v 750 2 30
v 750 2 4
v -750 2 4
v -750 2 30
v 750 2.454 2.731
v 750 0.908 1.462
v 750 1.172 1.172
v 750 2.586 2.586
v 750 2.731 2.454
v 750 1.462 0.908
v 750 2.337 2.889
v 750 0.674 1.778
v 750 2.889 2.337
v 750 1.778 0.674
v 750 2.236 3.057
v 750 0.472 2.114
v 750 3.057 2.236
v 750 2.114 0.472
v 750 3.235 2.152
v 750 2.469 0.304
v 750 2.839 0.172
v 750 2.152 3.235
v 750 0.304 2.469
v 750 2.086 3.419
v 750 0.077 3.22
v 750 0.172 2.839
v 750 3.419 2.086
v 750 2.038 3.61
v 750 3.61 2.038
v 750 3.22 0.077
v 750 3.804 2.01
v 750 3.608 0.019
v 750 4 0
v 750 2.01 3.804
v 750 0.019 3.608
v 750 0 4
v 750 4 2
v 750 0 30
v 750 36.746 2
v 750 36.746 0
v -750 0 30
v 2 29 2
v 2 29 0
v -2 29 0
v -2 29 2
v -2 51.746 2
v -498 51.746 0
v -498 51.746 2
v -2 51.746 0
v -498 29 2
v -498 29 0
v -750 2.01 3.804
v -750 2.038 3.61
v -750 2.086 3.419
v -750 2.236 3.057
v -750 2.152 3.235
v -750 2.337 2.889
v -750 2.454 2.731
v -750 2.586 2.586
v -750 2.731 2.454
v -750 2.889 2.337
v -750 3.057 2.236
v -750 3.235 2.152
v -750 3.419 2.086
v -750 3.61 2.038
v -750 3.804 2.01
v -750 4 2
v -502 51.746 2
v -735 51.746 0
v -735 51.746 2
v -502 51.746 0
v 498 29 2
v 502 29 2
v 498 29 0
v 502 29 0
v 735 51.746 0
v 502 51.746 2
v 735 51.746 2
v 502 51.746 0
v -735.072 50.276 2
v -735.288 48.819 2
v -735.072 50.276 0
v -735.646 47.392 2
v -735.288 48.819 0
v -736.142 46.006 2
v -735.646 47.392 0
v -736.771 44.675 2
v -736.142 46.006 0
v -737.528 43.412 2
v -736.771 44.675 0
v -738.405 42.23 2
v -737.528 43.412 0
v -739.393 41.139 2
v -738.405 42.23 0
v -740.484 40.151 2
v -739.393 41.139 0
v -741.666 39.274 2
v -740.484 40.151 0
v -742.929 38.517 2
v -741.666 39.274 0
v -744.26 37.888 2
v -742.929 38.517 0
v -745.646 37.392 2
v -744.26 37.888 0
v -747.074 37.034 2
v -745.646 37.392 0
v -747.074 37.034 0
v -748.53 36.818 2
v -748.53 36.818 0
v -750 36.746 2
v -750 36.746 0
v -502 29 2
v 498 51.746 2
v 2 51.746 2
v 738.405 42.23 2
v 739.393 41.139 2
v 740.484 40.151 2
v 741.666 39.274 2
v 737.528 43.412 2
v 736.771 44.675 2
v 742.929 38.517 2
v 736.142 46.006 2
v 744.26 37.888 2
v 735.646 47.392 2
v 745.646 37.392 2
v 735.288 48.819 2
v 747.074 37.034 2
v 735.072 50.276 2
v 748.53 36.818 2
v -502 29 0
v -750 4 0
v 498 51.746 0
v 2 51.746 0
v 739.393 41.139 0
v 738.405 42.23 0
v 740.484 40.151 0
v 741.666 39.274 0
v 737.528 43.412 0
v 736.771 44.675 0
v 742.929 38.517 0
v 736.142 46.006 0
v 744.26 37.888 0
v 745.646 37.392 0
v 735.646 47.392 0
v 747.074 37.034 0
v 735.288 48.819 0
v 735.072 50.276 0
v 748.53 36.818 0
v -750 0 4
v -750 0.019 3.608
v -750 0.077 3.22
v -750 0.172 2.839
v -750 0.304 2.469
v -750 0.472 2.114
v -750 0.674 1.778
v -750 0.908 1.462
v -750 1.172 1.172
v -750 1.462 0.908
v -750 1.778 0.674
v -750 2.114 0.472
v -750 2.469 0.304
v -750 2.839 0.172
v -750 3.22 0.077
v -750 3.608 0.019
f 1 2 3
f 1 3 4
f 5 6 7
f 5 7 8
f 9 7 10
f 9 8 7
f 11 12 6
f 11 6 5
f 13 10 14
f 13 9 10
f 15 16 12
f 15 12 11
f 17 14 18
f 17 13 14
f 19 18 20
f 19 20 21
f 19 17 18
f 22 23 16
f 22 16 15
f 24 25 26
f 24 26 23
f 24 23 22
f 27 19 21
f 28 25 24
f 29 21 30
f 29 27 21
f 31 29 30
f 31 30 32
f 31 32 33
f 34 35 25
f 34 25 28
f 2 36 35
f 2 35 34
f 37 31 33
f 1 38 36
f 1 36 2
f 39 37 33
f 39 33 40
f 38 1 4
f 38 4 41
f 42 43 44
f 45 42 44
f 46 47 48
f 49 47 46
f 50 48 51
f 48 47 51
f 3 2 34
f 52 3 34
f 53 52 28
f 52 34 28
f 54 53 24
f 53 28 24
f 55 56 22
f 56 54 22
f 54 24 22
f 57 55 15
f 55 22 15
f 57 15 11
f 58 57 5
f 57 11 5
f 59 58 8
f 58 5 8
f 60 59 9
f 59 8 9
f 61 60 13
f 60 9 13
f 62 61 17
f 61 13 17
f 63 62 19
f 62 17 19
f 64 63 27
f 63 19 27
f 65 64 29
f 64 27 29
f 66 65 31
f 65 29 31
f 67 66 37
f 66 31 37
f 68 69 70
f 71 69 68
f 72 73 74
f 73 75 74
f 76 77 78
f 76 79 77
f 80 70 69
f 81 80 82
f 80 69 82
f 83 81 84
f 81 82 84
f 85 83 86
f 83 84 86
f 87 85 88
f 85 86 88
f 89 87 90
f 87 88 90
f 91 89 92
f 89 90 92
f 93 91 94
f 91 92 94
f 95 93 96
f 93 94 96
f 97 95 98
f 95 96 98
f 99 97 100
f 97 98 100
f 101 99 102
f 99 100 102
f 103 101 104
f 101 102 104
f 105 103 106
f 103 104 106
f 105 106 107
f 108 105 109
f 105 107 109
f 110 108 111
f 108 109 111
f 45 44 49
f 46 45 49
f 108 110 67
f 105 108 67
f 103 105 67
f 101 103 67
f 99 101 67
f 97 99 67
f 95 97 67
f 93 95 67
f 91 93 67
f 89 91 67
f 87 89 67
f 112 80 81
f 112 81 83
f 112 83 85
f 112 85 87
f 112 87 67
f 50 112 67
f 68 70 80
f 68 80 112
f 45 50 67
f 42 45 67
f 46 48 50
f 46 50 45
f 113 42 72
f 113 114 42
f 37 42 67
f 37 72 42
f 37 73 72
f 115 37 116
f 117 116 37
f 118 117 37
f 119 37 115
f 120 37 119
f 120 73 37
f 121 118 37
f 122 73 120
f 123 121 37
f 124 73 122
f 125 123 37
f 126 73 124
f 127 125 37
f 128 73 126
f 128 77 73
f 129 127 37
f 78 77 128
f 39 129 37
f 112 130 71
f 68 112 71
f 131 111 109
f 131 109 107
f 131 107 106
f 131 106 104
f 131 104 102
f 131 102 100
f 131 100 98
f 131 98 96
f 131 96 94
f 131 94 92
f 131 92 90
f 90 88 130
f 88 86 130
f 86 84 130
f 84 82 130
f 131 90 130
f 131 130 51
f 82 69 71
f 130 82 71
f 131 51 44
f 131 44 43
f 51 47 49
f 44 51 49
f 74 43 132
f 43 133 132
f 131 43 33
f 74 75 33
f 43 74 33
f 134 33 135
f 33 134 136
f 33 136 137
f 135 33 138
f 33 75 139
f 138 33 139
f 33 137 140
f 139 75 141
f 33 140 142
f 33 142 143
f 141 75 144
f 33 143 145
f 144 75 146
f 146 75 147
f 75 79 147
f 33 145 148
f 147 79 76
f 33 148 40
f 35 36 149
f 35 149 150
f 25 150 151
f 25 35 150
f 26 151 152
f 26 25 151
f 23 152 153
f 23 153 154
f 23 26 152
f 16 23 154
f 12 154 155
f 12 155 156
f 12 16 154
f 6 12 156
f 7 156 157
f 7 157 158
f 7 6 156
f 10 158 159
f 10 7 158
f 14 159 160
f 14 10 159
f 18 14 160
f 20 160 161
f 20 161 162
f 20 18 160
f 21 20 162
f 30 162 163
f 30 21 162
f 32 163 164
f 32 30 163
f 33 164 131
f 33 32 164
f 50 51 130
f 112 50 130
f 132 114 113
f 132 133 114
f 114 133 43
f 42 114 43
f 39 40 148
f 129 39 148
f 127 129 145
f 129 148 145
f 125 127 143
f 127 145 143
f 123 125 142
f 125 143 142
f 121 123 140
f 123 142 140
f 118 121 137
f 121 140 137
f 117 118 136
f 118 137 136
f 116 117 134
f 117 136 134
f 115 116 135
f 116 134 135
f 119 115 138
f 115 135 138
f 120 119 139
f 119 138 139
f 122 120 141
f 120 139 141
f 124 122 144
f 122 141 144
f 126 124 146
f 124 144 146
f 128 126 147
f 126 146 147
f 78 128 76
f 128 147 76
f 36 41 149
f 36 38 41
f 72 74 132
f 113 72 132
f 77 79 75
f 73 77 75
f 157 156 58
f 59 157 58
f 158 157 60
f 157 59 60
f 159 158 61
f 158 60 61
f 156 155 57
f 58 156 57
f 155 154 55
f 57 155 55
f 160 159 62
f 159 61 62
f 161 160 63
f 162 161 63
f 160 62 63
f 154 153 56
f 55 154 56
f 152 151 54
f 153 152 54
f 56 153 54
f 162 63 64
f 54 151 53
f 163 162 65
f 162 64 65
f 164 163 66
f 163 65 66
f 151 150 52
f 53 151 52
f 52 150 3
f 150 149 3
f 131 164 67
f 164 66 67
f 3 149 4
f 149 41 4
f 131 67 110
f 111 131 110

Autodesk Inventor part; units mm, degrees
ref_plane "YZ Plane" through (0, 0, 0) normal (1, 0, 0) x (0, 1, 0)
ref_plane "XZ Plane" through (0, 0, 0) normal (0, 1, 0) x (-1, 0, 0)
ref_plane "XY Plane" through (0, 0, 0) normal (0, 0, 1) x (1, 0, 0)
sketch "Sketch1" plane through (0, 0, 0) normal (0, 0, 1) x (1, 0, 0)
  line L0 (-750, 51.7458) -> (750, 51.7458)
  line L1 (750, 51.7458) -> (750, 0)
  line L2 (750, 0) -> (-750, 0)
  line L3 (-750, 0) -> (-750, 51.7458)
  point P0 (0, 0)
  point P1 (0, 0)
  dimension "d0" = 1500
  dimension "d1" = 51.7458
extrude "Plate1" add sketch "Sketch1" along normal blind 2
sketch "Sketch2" plane through (750, 2, 0) normal (0, -1, 0) x (1, 0, 0)
  line L0 (-1500, 0) -> (0, 0)
  line L1 (0, 0) -> (0, 30)
  line L2 (0, 30) -> (-1500, 30)
  line L3 (-1500, 30) -> (-1500, 0)
edge flange "Flange1" height 30 angle 90 thickness 2 bend radius 2 thickness toward (0, -1, 0) relief tear relief width 2 relief depth 1 edges at (0, 0, 2) wall of the first edge with corners at (-750, 2, 0) (750, 2, 0) (750, 2, 30) (-750, 2, 30)
bend "Bend1"
corner "Corner1"
sketch "Sketch5" plane through (0, 0, 0) normal (0, 0, -1) x (-1, 0, 0)
  line L0 (750, 51.7458) -> (-750, 51.7458) projected
  line L1 (498, 51.7458) -> (498, 29)
  line L2 (498, 29) -> (500, 29)
  line L3 (500, 29) -> (500, 51.7458) construction
  line L4 (750, 0) -> (-750, 0) projected
  line L5 (500, 29) -> (502, 29)
  line L6 (502, 29) -> (502, 51.7458)
  point P0 (0, 0)
  dimension "d18" = 2
  dimension "d19" = 250
  dimension "d20" = 29
  dimension "d27" = 2
extrude "Extrusion1" cut sketch "Sketch5" against normal through all
pattern_linear "Rectangular Pattern1" count 3 spacing 500 along (1, 0, 0) of "Extrusion1"
sketch "Sketch6" plane through (0, 0, 0) normal (0, 0, -1) x (-1, 0, 0)
  line L0 (-750, 51.7458) -> (-750, 4) projected
  circle A0 centre (-750, 51.7458) radius 15
  line L1 (-750, 51.7458) -> (750, 51.7458) projected
  point P0 (0, 0)
  point P1 (-502, 51.7458)
  point P2 (-735, 51.7458)
  point P3 (-750, 36.7458)
  dimension "d24" = 30
extrude "Extrusion2" cut sketch "Sketch6" against normal through all contours L1 A0 L0 picked at (-740.1254, 50.6332)
mirror "Mirror1" about plane through (0, 0, 0) normal (1, 0, 0) of "Extrusion2"
equation "\"d1\" = Стрингер_1"
equation "\"d18\" = Thickness"
equation "\"d27\" = d18"
equation "\"d2\" = Thickness"
equation "\"d3\" = BendReliefWidth"
equation "\"d4\" = BendReliefDepth"
equation "\"d5\" = MinimumRemnant"
equation "\"d6\" = TransitionRadius"
equation "\"d9\" = BendRadius"
equation "\"d10\" = CornerReliefSize"
equation "\"d11\" = GapSize"
equation "\"d12\" = JacobiRadiusSize"
equation "\"BendRadius\" = Thickness"
equation "\"BendReliefWidth\" = Thickness"
equation "\"BendReliefDepth\" = 0.5 * Thickness"
equation "\"CornerReliefSize\" = 4 * Thickness"
equation "\"MinimumRemnant\" = 2 * Thickness"
equation "\"TransitionRadius\" = BendRadius"
equation "\"JacobiRadiusSize\" = BendRadius"
equation "\"GapSize\" = Thickness"
equation "\"qqqqqq\" = 67.35706"
equation "\"Стрингер_1\" = 51.745837"
equation "\"Thickness\" = 2"
properties part number "МОО 051 стрингер спина 12" material "Stainless Steel"
